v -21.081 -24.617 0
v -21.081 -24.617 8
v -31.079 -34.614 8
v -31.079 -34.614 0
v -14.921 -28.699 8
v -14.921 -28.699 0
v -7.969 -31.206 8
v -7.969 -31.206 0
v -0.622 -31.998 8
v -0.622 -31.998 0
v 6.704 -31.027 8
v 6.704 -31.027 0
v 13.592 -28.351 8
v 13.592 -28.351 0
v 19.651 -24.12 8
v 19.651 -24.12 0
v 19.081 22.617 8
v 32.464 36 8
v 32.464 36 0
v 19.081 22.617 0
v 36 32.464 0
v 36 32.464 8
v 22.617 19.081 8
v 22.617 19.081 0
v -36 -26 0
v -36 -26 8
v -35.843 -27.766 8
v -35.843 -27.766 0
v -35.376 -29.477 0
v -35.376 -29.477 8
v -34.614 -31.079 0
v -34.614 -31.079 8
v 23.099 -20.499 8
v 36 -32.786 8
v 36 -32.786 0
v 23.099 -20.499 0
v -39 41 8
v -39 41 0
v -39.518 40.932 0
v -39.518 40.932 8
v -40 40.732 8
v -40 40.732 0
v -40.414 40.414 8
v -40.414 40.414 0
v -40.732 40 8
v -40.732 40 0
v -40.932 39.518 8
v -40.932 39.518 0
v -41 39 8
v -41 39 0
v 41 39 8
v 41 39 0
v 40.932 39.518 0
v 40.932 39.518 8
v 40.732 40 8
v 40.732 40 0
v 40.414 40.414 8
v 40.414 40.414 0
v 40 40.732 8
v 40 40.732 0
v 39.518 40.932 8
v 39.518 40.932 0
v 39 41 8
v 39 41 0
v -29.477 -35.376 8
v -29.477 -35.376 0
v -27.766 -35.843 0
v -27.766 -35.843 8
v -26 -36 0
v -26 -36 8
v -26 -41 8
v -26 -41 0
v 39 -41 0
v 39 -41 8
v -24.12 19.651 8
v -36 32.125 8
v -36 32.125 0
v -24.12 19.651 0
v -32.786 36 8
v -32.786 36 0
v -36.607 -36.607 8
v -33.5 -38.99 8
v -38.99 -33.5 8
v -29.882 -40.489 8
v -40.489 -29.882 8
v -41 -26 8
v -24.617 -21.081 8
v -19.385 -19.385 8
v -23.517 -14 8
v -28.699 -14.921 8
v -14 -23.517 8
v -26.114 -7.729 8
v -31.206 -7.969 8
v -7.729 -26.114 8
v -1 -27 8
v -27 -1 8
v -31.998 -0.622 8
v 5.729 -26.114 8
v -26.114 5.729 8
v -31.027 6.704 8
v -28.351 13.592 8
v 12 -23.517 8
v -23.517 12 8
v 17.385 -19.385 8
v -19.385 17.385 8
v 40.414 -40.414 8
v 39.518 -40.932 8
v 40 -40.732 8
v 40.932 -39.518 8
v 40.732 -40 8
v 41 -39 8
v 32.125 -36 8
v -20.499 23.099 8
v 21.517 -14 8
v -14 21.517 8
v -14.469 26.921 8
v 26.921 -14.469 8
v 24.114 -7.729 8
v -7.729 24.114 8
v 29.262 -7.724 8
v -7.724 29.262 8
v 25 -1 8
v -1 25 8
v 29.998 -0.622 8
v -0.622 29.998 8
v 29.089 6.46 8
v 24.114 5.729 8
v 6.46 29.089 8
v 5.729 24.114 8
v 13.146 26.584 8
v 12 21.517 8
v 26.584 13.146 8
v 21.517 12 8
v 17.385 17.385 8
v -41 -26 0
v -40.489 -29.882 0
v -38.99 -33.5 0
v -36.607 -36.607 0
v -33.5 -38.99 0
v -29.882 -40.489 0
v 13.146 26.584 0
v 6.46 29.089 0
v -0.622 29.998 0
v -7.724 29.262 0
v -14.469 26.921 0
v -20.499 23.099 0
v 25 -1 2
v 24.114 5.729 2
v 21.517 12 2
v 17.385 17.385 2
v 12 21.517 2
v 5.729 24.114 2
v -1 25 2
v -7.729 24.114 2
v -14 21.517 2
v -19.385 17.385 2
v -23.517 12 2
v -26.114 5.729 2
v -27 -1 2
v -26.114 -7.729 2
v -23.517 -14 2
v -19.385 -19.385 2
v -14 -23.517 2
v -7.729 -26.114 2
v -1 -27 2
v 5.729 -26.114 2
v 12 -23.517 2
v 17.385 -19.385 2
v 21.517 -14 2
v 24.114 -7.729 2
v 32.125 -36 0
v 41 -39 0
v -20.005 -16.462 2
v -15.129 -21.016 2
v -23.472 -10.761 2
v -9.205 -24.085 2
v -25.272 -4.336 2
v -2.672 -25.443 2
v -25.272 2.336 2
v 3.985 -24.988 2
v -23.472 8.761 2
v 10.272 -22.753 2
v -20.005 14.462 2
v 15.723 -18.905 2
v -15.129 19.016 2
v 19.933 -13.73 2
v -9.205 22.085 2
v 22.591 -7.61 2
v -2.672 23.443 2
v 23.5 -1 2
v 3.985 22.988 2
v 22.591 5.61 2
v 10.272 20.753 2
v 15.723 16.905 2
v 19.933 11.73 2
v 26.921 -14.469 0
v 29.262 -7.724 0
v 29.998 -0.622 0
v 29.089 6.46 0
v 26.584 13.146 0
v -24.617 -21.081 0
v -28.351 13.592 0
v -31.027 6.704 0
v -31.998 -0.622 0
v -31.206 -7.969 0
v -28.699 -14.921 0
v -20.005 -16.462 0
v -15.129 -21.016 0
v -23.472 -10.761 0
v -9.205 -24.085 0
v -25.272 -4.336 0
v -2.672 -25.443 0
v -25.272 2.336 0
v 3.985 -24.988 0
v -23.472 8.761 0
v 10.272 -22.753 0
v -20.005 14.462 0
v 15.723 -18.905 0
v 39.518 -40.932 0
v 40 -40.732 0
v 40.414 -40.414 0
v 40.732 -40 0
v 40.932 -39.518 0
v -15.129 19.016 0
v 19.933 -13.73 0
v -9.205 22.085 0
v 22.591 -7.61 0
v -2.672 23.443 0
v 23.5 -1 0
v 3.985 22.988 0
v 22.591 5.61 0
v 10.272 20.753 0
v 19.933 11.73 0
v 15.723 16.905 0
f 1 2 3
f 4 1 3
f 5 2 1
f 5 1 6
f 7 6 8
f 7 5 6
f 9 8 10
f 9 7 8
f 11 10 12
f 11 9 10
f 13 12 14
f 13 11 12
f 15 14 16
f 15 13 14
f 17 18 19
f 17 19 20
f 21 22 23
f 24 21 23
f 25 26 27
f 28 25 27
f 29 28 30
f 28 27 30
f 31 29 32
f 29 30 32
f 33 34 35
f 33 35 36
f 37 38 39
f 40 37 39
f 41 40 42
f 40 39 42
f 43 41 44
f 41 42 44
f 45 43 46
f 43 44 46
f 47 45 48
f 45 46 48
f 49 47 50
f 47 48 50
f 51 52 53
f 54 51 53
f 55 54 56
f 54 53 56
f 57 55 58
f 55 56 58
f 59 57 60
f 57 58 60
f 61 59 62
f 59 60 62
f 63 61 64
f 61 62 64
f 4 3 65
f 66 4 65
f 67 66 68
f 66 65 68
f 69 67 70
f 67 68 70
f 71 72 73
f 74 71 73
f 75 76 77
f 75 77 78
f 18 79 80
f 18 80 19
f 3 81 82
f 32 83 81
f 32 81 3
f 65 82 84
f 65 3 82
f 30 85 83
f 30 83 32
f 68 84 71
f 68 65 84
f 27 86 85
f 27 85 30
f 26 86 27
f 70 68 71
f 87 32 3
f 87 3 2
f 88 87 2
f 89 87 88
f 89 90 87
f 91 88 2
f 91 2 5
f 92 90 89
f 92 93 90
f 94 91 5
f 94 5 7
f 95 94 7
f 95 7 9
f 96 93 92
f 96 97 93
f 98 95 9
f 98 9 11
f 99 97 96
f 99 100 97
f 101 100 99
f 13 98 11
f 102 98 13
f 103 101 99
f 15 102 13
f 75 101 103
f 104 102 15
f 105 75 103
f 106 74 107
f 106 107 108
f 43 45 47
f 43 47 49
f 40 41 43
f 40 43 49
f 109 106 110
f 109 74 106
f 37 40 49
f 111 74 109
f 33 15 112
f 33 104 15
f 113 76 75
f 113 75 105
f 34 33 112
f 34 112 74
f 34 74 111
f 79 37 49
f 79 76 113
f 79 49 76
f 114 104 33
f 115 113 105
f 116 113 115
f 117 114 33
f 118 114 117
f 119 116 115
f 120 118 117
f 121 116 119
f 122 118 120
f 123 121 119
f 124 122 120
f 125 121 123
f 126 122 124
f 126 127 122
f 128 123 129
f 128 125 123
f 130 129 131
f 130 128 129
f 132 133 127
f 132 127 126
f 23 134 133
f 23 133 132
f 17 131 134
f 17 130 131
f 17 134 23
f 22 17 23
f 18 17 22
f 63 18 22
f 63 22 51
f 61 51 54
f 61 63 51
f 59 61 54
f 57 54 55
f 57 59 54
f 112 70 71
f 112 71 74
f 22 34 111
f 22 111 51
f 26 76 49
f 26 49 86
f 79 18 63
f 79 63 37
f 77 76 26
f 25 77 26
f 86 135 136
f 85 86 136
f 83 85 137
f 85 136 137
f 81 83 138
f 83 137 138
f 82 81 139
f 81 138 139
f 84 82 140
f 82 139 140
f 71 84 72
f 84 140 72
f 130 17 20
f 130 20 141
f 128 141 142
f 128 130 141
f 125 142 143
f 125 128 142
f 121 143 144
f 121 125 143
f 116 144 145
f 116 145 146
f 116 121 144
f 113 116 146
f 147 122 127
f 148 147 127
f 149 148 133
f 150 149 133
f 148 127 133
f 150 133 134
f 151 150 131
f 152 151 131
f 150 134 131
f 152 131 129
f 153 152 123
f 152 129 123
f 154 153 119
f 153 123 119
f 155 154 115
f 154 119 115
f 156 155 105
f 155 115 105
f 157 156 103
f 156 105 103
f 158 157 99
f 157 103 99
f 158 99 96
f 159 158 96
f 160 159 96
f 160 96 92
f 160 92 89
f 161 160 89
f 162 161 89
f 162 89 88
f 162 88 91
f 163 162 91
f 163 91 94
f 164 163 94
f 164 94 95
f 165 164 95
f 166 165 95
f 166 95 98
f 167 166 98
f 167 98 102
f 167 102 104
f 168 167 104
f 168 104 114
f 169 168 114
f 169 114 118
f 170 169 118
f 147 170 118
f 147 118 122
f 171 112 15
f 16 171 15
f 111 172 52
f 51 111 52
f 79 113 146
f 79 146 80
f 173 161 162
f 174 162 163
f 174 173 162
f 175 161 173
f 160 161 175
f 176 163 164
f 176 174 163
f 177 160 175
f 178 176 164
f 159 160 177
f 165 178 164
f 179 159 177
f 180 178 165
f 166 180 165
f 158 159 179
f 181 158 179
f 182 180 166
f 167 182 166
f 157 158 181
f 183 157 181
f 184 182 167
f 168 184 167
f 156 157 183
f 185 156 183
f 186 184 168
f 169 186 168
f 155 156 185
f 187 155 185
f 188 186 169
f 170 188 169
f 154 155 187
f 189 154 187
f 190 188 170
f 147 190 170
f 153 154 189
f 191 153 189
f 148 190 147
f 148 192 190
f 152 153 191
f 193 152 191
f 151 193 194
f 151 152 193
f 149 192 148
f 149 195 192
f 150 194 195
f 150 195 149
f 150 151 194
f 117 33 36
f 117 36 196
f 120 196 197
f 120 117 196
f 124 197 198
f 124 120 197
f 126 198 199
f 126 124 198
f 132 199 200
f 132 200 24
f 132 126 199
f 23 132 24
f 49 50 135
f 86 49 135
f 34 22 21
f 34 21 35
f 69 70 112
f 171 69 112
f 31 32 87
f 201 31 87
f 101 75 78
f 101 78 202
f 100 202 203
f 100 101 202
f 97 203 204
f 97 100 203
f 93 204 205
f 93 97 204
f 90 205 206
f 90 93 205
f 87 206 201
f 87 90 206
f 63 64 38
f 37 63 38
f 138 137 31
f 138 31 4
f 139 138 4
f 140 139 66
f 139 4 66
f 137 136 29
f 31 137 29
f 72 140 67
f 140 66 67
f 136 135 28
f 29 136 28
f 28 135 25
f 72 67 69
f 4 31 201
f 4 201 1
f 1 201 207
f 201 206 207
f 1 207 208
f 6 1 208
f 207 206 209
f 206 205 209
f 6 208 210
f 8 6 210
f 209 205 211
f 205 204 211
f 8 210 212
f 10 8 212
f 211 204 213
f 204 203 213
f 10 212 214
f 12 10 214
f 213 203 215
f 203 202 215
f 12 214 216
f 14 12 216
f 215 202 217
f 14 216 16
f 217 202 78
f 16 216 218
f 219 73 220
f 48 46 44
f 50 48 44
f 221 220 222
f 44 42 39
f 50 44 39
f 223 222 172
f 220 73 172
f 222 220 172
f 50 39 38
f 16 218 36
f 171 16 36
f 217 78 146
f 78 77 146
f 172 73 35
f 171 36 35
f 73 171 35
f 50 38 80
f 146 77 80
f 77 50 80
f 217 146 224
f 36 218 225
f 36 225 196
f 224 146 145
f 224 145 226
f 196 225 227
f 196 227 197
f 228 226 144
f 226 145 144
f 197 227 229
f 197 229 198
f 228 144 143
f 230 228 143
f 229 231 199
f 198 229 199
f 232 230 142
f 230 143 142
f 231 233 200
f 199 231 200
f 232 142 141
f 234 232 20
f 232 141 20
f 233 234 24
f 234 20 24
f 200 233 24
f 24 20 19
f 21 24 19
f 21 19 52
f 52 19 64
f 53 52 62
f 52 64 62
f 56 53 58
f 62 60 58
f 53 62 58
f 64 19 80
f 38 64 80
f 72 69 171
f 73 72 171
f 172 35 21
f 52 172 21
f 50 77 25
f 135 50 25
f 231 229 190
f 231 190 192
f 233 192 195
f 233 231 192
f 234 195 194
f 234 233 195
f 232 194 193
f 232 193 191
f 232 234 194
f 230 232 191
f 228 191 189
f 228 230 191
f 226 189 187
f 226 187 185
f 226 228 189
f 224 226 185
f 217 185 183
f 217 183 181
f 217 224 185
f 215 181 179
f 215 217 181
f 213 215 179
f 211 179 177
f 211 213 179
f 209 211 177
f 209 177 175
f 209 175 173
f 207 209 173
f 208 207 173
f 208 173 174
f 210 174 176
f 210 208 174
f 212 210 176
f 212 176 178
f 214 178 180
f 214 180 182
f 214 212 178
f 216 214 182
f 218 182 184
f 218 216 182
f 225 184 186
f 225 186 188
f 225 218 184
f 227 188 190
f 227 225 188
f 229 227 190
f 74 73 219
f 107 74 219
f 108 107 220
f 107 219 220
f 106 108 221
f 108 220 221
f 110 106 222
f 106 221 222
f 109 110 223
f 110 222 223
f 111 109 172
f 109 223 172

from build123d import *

# Parameters (mm, degrees)
PAD_DEPTH       = 8
SKETCH001_R     = 26
POCKET_DEPTH    = 8.001
POCKET001_DEPTH = 8.001
POCKET002_DEPTH = 8.001
POCKET003_DEPTH = 8.001
POCKET004_DEPTH = 8.001
SKETCH006_R     = 26
SKETCH006_R_2   = 24.5
PAD001_DEPTH    = 2


with BuildPart() as part:
    # Sketch → Pad (new body)
    with BuildSketch(Plane.XY):
        with BuildLine():
            Line((-41, 39), (-41, -26))
            ThreePointArc((-41, -26), (-36.606602, -36.606602), (-26, -41))
            Line((-26, -41), (39, -41))
            ThreePointArc((39, -41), (40.414214, -40.414214), (41, -39))
            Line((41, -39), (41, 39))
            ThreePointArc((41, 39), (40.414214, 40.414214), (39, 41))
            Line((39, 41), (-39, 41))
            ThreePointArc((-39, 41), (-40.414214, 40.414214), (-41, 39))
        make_face()
    extrude(amount=PAD_DEPTH)

    # Sketch001 (on DatumPlane) → Pocket (cut, through all)
    with BuildSketch(Plane.XY.offset(8)):
        with Locations((-1, -1)):
            Circle(SKETCH001_R)
    extrude(amount=-POCKET_DEPTH, mode=Mode.SUBTRACT)

    # Sketch002 (on DatumPlane) → Pocket001 (cut, through all)
    with BuildSketch(Plane.XY.offset(8)):
        with BuildLine():
            Line((-26, -36), (32.125, -36))
            Line((32.125, -36), (19.651021, -24.12002))
            ThreePointArc((-21.081146, -24.61668), (-0.622036, -31.997696), (19.651021, -24.12002))
            Line((-21.081146, -24.61668), (-31.078765, -34.614299))
            ThreePointArc((-31.078765, -34.614299), (-28.632205, -35.647357), (-26, -36))
        make_face()
    extrude(amount=-POCKET001_DEPTH, mode=Mode.SUBTRACT)

    # Sketch003 (on DatumPlane) → Pocket002 (cut, through all)
    with BuildSketch(Plane.XY.offset(8)):
        with BuildLine():
            ThreePointArc((-36, -26), (-35.647357, -28.632205), (-34.614299, -31.078765))
            Line((-34.614299, -31.078765), (-24.61668, -21.081146))
            ThreePointArc((-24.12002, 19.651021), (-31.997696, -0.622036), (-24.61668, -21.081146))
            Line((-36, 32.125), (-24.12002, 19.651021))
            Line((-36, 32.125), (-36, -26))
        make_face()
    extrude(amount=-POCKET002_DEPTH, mode=Mode.SUBTRACT)

    # Sketch004 (on DatumPlane) → Pocket003 (cut, through all)
    with BuildSketch(Plane.XY.offset(8)):
        with BuildLine():
            Line((-32.785714, 36), (32.464466, 36))
            Line((32.464466, 36), (19.081146, 22.61668))
            ThreePointArc((19.081146, 22.61668), (-0.622036, 29.997696), (-20.49933, 23.099297))
            Line((-20.49933, 23.099297), (-32.785714, 36))
        make_face()
    extrude(amount=-POCKET003_DEPTH, mode=Mode.SUBTRACT)

    # Sketch005 (on DatumPlane) → Pocket004 (cut, through all)
    with BuildSketch(Plane.XY.offset(8)):
        with BuildLine():
            Line((36, 32.464466), (36, -32.785714))
            Line((36, -32.785714), (23.099297, -20.49933))
            ThreePointArc((23.099297, -20.49933), (29.997696, -0.622036), (22.61668, 19.081146))
            Line((36, 32.464466), (22.61668, 19.081146))
        make_face()
    extrude(amount=-POCKET004_DEPTH, mode=Mode.SUBTRACT)

    # Sketch006 → Pad001 (join)
    with BuildSketch(Plane.XY):
        with Locations((-1, -1)):
            Circle(SKETCH006_R)
        with Locations((-1, -1)):
            Circle(SKETCH006_R_2, mode=Mode.SUBTRACT)
    extrude(amount=PAD001_DEPTH)


solid = part.part
